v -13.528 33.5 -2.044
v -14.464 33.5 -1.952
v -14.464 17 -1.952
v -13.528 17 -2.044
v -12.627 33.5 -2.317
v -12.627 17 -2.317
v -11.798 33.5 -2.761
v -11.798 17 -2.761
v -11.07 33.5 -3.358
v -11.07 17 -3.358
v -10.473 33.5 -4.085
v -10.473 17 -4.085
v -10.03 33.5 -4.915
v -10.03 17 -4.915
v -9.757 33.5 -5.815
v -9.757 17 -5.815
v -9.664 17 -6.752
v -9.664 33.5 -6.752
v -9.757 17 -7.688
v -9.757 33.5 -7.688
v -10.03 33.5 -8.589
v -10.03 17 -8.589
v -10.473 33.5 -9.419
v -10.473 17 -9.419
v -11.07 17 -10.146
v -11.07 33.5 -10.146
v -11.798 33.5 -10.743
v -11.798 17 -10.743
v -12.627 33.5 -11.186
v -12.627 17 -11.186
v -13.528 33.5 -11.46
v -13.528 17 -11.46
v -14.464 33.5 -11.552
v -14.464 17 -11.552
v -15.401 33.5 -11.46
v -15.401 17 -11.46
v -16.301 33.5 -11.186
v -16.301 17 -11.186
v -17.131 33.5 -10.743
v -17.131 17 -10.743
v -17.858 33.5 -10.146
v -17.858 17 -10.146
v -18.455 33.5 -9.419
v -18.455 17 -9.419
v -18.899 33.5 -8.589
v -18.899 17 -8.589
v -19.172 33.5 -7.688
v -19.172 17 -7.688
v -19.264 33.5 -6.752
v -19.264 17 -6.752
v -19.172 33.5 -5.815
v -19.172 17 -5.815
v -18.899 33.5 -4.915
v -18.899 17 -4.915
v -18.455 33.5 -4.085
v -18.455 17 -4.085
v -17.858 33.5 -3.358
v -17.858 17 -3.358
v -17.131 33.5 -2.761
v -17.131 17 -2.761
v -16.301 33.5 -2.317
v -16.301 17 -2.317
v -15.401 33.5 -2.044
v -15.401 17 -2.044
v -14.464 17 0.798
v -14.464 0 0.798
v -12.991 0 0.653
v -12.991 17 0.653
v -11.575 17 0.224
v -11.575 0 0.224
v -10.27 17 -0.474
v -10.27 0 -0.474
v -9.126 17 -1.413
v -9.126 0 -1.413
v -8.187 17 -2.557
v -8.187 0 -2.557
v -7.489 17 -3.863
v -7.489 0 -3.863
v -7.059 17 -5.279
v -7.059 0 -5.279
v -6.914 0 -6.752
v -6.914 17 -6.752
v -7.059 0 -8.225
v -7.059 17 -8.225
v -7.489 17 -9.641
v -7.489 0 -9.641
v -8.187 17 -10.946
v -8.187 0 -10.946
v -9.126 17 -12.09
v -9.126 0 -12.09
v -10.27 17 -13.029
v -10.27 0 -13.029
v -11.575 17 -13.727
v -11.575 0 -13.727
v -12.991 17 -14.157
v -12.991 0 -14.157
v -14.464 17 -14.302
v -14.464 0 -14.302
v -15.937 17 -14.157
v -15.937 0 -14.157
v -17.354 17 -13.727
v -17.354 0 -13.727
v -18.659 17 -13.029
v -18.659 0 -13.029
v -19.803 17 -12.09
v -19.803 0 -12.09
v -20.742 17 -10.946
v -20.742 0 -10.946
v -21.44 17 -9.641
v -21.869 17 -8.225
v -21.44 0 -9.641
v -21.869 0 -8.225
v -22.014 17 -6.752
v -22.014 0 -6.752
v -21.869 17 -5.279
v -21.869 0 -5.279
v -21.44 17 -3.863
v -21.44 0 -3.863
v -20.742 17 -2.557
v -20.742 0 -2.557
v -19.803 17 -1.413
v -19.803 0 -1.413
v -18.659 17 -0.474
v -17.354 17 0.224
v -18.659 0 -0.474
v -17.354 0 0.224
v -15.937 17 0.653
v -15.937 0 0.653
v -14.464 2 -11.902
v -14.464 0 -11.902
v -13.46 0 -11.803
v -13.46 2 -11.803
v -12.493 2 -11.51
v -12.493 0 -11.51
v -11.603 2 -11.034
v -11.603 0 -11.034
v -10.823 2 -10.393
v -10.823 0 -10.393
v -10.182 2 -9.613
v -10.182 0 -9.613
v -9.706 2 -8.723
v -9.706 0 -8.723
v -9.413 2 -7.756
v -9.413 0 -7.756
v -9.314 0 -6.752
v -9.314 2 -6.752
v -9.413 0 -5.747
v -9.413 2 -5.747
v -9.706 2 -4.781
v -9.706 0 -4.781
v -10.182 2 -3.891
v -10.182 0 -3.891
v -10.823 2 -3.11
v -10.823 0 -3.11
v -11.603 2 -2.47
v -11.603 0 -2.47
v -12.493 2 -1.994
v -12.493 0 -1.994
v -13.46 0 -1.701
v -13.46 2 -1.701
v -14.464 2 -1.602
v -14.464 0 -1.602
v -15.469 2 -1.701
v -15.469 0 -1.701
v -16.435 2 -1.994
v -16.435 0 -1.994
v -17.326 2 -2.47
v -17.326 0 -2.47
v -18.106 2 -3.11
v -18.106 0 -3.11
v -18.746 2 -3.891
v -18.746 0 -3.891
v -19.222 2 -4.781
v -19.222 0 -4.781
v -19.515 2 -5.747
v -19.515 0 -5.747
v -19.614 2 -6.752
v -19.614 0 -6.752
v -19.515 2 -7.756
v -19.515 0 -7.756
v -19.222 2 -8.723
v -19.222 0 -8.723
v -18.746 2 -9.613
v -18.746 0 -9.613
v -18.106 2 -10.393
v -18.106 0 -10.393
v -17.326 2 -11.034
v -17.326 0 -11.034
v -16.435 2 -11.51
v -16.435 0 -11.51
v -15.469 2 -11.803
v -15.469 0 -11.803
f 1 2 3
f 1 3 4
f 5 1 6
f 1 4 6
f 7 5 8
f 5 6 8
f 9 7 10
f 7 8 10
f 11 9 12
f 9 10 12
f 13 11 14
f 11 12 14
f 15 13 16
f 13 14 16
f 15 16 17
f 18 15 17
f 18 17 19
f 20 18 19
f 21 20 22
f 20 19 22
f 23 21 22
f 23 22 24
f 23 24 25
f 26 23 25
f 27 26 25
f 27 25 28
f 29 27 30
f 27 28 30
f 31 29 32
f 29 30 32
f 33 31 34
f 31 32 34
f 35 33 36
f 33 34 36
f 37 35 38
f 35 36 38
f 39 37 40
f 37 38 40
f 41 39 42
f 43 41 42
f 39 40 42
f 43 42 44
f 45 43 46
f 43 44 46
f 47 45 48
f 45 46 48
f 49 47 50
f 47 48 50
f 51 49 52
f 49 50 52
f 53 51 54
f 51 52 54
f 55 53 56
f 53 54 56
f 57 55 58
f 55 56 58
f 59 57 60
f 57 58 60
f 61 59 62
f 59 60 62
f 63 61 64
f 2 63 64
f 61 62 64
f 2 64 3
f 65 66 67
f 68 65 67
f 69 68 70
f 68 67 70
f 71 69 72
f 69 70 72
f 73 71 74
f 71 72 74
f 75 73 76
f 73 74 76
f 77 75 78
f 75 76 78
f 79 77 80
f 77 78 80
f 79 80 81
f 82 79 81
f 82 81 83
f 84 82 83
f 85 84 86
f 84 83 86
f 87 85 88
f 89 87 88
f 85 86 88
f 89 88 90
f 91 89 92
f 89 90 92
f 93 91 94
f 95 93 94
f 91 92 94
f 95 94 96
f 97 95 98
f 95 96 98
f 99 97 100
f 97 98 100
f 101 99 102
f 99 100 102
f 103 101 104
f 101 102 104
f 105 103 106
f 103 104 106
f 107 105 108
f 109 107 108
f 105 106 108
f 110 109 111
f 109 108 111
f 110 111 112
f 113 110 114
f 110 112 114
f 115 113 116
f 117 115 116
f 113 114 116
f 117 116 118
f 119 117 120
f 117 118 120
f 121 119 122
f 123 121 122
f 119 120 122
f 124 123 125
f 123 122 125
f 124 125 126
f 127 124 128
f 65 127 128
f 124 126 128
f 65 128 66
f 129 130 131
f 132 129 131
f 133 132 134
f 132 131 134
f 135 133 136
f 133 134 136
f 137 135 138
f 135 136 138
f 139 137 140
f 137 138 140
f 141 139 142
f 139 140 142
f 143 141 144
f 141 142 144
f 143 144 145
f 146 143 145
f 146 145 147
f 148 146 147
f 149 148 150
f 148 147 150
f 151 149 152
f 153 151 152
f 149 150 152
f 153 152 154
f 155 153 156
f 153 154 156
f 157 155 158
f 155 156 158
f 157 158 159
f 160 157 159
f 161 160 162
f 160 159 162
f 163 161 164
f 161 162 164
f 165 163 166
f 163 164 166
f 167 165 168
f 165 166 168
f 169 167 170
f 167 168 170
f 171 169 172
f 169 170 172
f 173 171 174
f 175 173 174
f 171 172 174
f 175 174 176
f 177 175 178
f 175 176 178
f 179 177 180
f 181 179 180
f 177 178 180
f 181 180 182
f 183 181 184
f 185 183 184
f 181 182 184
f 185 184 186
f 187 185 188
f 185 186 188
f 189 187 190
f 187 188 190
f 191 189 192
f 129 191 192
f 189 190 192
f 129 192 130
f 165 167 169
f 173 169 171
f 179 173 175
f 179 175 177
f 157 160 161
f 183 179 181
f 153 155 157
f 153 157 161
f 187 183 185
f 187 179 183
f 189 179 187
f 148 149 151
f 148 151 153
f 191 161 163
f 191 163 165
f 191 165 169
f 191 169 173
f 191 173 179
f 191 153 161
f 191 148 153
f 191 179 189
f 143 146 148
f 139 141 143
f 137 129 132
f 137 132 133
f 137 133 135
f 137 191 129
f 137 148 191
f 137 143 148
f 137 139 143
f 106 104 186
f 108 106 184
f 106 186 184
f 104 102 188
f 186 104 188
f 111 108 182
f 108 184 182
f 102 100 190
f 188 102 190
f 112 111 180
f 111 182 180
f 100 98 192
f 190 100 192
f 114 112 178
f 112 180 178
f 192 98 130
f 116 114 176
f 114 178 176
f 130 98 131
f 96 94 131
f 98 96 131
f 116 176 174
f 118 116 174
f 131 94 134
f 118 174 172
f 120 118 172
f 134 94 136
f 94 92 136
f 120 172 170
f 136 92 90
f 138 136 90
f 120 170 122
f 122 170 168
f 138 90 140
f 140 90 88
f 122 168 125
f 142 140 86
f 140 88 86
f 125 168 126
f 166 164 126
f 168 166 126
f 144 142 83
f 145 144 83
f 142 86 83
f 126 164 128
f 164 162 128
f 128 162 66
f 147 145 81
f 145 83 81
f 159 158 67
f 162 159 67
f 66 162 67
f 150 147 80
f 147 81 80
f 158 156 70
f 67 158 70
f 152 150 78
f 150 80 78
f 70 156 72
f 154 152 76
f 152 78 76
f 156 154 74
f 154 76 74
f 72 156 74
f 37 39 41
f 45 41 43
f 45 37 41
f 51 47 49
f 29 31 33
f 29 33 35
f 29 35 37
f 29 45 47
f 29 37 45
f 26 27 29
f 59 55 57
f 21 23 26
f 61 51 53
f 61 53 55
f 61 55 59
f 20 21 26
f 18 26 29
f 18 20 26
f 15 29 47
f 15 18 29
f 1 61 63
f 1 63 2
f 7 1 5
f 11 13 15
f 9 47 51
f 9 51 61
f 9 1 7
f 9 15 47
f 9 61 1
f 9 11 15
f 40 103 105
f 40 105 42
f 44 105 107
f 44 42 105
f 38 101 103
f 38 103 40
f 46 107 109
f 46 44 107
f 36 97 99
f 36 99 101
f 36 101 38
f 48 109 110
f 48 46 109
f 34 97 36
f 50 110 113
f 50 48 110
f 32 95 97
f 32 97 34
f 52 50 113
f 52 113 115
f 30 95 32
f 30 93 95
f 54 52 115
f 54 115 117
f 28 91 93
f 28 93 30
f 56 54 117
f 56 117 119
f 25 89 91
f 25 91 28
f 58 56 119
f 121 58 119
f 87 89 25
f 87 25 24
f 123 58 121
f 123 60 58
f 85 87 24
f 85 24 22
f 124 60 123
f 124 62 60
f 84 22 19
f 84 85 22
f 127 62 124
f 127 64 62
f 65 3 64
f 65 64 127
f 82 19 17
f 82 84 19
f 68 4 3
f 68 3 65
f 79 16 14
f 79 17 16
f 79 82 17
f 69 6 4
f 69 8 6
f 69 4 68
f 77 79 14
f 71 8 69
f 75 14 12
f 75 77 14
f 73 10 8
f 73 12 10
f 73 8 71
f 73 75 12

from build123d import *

# Parameters (mm, degrees)
SKETCH_1_R          = 7.55
EXTRUDE_1_DEPTH     = 17
SKETCH_2_R          = 5.15
CUT_EXTRUDE_1_DEPTH = 2
SKETCH_3_R          = 4.8
EXTRUDE_2_DEPTH     = 16.5


with BuildPart() as part:
    # 草图1 → 凸台-拉伸1 (new body)
    with BuildSketch(Plane(origin=(0, 0, 0), x_dir=(1, 0, 0), z_dir=(0, 1, 0))):
        with Locations(Location((-14.464315339, 6.751763544, 0), (0, 0, 270))):
            Circle(SKETCH_1_R)
    extrude(amount=EXTRUDE_1_DEPTH)

    # 草图2 → 切除-拉伸1 (cut)
    with BuildSketch(Plane.XZ):
        with Locations(Location((-14.464315339, -6.751763544, 0), (0, 0, 270))):
            Circle(SKETCH_2_R)
    extrude(amount=-CUT_EXTRUDE_1_DEPTH, mode=Mode.SUBTRACT)

    # 草图3 → 凸台-拉伸2 (add)
    with BuildSketch(Plane(origin=(0, 17, 0), x_dir=(1, 0, 0), z_dir=(0, 1, 0))):
        with Locations(Location((-14.464315339, 6.751763544, 0), (0, 0, 270))):
            Circle(SKETCH_3_R)
    extrude(amount=EXTRUDE_2_DEPTH)


solid = part.part
